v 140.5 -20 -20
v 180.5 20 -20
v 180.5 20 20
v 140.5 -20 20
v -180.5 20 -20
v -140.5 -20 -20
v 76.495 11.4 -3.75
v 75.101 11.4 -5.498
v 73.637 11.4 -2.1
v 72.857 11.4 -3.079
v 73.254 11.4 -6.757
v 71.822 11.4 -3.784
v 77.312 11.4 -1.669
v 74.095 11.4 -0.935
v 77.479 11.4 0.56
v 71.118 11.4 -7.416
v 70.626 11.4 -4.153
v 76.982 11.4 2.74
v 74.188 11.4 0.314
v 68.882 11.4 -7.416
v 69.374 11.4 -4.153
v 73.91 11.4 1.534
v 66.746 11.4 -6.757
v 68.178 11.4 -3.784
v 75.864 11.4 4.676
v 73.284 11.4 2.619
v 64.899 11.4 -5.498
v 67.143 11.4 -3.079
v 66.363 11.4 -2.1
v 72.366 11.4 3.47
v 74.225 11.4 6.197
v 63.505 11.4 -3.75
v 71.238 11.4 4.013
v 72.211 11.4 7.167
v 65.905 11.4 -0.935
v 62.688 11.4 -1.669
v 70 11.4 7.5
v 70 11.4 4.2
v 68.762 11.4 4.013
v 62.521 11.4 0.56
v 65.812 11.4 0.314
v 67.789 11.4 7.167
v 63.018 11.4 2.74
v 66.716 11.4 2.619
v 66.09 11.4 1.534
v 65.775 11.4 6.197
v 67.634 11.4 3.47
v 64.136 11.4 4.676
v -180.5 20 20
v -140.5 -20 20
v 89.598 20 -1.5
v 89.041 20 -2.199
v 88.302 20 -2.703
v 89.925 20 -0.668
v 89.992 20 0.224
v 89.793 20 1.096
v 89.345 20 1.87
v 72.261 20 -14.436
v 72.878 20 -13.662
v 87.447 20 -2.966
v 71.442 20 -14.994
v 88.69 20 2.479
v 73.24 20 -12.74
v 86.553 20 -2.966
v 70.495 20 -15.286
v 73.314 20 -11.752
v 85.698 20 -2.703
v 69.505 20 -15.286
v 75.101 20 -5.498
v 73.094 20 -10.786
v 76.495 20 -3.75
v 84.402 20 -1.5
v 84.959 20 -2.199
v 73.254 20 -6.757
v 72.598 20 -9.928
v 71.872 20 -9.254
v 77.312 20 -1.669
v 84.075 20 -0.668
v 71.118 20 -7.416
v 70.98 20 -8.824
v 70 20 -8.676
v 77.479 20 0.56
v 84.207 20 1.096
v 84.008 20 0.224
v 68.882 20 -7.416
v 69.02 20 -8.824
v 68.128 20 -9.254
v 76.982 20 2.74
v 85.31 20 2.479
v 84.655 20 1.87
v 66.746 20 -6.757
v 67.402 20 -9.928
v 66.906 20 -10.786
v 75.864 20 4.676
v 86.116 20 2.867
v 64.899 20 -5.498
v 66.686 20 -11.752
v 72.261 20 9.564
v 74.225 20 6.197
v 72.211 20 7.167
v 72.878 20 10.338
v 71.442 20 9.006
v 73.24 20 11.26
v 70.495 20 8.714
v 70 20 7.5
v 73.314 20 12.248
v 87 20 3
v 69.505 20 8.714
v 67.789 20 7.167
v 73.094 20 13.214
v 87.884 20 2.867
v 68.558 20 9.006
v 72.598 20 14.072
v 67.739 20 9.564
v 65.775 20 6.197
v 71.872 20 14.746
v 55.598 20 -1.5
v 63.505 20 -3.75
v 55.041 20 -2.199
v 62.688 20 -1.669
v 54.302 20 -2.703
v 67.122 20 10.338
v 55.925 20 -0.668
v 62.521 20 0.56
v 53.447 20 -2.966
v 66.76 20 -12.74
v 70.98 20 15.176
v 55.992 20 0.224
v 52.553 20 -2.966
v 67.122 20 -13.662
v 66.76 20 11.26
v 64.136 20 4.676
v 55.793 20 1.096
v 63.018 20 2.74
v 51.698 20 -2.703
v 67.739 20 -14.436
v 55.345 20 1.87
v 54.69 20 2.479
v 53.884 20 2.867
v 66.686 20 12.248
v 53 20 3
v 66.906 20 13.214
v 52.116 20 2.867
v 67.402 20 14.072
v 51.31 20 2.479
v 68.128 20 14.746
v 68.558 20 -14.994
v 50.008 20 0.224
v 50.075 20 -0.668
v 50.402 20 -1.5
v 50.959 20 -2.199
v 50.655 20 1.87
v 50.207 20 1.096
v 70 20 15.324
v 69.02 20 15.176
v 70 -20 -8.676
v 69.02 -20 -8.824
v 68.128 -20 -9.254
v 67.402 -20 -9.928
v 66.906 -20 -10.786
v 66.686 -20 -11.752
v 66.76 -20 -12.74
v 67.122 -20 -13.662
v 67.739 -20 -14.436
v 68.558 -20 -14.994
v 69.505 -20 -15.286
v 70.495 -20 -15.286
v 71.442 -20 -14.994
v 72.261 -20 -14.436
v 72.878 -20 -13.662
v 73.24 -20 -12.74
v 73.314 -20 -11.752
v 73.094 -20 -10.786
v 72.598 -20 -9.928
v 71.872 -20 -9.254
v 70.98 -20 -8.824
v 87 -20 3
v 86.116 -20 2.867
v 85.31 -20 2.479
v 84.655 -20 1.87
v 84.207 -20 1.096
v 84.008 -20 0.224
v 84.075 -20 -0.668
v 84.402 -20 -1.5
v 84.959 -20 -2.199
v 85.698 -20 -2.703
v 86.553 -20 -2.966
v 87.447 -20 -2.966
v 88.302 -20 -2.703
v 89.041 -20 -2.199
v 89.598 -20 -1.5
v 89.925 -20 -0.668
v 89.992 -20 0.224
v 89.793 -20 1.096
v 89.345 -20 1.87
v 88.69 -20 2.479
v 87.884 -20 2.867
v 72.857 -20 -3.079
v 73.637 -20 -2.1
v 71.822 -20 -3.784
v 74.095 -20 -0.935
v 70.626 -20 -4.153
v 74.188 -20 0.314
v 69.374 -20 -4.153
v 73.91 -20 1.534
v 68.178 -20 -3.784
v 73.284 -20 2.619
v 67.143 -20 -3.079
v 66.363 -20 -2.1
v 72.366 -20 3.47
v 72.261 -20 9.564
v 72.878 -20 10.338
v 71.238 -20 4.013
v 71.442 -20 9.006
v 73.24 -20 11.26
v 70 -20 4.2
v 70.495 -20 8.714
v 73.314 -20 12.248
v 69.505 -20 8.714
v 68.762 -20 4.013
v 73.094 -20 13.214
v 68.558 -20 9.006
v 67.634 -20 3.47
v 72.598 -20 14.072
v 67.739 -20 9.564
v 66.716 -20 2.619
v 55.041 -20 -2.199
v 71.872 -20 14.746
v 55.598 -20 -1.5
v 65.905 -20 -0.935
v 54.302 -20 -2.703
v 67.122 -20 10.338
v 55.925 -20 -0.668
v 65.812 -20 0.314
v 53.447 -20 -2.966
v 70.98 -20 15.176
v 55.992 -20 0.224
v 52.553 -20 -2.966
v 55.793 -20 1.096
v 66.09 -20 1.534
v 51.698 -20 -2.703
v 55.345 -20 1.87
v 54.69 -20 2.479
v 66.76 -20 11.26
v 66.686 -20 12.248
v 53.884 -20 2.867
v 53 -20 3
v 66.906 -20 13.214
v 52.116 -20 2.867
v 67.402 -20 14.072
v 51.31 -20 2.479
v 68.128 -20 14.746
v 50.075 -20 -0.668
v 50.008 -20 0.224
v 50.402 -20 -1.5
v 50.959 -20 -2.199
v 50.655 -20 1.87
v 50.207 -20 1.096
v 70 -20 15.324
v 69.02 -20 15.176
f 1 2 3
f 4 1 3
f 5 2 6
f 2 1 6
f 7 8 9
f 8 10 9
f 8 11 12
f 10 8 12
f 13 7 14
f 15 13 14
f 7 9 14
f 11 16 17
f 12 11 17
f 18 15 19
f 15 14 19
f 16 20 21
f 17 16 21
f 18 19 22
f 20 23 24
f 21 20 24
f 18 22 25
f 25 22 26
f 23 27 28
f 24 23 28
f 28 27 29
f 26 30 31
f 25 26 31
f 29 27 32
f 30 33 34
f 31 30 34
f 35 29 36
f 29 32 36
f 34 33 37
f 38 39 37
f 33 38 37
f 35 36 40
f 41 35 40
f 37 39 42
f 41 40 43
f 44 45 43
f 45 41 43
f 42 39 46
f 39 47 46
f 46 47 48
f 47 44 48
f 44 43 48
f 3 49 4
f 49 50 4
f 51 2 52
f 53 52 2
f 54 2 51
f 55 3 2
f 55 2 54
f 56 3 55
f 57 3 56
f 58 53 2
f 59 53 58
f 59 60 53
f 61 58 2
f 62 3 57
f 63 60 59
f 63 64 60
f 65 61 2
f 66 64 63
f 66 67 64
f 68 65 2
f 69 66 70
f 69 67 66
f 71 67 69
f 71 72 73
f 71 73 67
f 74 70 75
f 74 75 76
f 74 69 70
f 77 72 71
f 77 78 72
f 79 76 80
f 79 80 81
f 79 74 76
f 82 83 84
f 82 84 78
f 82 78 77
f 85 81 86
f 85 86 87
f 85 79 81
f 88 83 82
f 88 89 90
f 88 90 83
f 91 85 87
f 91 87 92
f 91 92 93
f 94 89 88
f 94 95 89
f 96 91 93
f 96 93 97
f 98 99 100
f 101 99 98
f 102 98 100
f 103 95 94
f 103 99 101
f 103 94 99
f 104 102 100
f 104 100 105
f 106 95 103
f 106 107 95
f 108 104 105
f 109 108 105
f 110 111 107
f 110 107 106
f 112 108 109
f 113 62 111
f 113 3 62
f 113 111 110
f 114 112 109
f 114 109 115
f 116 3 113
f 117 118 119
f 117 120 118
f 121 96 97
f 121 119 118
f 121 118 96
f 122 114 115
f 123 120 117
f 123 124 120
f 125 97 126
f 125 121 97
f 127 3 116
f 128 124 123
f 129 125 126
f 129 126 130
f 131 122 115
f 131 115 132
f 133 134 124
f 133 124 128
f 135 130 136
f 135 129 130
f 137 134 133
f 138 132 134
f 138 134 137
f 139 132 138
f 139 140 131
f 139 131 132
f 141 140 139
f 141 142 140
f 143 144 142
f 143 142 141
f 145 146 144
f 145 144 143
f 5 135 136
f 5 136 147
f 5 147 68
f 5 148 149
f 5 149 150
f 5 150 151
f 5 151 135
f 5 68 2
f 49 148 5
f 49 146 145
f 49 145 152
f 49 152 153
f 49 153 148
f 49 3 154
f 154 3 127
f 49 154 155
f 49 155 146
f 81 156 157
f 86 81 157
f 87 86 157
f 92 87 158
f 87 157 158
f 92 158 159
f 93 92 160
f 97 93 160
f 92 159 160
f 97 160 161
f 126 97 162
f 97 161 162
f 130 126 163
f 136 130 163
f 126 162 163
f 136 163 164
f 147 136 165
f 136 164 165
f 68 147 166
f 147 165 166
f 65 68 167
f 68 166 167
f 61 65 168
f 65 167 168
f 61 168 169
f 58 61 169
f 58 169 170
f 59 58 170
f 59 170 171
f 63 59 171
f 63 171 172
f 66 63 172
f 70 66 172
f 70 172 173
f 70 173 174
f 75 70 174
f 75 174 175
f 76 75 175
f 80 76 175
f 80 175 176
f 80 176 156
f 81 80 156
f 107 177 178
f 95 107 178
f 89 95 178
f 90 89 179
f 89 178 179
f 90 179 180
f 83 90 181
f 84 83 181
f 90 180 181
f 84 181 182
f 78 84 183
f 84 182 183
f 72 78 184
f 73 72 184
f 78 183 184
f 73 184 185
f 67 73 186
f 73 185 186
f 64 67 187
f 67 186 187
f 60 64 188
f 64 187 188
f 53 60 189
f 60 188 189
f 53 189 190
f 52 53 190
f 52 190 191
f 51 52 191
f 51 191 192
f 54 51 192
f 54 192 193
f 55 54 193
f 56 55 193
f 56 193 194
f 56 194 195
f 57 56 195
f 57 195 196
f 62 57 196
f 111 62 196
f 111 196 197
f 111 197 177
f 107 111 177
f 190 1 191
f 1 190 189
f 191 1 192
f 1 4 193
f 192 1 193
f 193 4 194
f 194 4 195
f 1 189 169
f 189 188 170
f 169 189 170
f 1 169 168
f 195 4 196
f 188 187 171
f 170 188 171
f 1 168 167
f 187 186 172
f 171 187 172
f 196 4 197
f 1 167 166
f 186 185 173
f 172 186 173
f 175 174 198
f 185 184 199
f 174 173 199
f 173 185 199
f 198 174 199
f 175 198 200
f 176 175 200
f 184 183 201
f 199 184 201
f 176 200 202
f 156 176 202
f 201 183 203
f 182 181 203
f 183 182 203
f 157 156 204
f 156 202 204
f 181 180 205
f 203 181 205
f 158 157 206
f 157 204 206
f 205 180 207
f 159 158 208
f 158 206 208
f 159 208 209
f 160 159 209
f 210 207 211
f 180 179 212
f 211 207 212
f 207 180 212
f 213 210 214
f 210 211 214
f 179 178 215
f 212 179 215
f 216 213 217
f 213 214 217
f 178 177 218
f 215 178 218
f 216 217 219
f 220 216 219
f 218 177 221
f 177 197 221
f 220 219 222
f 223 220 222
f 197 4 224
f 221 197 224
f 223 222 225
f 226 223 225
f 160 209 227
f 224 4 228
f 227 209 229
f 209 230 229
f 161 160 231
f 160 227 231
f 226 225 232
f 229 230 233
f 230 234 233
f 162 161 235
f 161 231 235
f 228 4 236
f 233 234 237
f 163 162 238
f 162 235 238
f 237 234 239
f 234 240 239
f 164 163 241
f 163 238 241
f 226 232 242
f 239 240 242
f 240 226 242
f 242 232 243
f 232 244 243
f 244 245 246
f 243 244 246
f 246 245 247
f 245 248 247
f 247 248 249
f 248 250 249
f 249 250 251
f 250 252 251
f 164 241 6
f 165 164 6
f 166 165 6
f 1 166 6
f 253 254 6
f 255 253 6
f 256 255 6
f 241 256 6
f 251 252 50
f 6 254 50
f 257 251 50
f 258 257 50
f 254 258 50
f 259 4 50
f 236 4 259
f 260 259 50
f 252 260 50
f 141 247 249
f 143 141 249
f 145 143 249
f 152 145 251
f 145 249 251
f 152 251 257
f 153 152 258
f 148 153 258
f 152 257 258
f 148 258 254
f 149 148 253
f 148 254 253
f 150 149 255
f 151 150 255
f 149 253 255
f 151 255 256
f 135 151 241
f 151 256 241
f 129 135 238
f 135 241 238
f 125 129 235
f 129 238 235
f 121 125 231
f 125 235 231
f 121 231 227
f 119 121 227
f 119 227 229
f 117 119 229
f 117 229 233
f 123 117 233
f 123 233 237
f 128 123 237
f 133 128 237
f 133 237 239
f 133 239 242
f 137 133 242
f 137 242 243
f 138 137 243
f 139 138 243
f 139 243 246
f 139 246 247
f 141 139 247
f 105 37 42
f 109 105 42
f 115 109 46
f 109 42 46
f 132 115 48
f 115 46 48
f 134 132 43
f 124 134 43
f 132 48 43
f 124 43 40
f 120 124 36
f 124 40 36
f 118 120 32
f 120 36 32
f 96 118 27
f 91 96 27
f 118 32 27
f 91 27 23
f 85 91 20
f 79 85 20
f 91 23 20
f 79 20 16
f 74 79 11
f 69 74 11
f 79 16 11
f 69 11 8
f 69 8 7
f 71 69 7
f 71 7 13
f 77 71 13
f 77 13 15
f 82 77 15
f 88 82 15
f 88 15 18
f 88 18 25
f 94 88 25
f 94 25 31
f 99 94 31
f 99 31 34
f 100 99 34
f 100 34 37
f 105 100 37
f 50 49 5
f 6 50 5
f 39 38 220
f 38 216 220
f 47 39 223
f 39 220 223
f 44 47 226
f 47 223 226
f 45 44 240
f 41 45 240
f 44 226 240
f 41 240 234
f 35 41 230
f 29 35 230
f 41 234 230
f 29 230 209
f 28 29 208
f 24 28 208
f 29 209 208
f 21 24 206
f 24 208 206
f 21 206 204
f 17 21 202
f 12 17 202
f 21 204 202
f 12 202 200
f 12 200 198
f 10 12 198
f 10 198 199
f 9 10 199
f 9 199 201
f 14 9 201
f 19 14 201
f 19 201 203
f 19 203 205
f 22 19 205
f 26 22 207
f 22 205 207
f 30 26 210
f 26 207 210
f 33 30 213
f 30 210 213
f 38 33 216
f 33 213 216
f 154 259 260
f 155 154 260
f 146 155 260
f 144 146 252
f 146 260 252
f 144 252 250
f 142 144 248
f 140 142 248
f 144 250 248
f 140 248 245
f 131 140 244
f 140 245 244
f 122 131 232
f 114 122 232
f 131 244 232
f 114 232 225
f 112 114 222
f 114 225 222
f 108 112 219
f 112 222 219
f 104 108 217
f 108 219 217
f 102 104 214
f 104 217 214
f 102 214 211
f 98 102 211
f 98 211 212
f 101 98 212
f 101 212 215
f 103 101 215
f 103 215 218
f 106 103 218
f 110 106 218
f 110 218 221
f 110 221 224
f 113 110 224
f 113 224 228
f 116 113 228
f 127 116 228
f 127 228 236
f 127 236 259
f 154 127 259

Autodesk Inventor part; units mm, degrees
ref_plane "XZ Plane" through (0, 0, 0) normal (0, 1, 0) x (-1, 0, 0)
ref_plane "XY Plane" through (0, 0, 0) normal (0, 0, 1) x (1, 0, 0)
sketch "Skizze1" plane through (0, 0, 0) normal (0, 1, 0) x (-1, 0, 0)
  line L0 (180.5, 20) -> (-180.5, 20)
  line L1 (-180.5, 20) -> (-180.5, -20)
  line L2 (-180.5, -20) -> (180.5, -20)
  line L3 (180.5, -20) -> (180.5, 20)
  line L4 (180.5, 20) -> (-180.5, -20) construction
  line L5 (-180.5, 20) -> (180.5, -20) construction
  point P0 (0, 0)
  dimension "d0" = 361
  dimension "d1" = 40
extrude "Extrusion1" add sketch "Skizze1" along normal mid plane 40
chamfer "Fasen1" distance 40 angle 45 2 edges at (-180.5, -20, 0) (180.5, -20, 0)
sketch "Skizze2" plane through (0, 20, 0) normal (0, 1, 0) x (1, 0, 0)
  line L0 (180.5, -20) -> (180.5, 20) projected
  line L1 (-180.5, 20) -> (-180.5, -20) projected
  line L2 (180.5, 20) -> (-180.5, 20) projected
  line L3 (-180.5, 0) -> (180.5, 0) construction
  line L4 (-180.5, -20) -> (180.5, -20) projected
  line L5 (70, -20) -> (70, 20) construction
  point P0 (0, 0)
  point P1 (70, 0)
  point P2 (87, 0)
  point P3 (53, 0)
  point P4 (70, -12)
  point P5 (70, 12)
  point P6 (70, 0)
  dimension "d24" = 20
  dimension "d25" = 17
  dimension "d26" = 17
  dimension "d34" = 70
  dimension "d35" = 12
  dimension "d36" = 12
hole "Bohrung1" at (87, 20, 0) at (53, 20, 0) direction (0, -1, 0) diameter 6 end through all
hole "Hole3" at (70, 20, 0) direction (0, -1, 0) diameter 8.4 end through all counterbore diameter 15 counterbore depth 8.6
hole "Hole4" at (70, 20, 12) at (70, 20, -12) direction (0, -1, 0) diameter 6.647 end through all thread size "M8x1.25" class "6H" standard "ISO Metric profile"
ref_plane "Work Plane1" through (70, 20, 12) normal (1, 0, 0) x (0, 1, 0)
equation "\"d0\" = Laenge_Rahmen"
equation "\"d1\" = Breite_Rahmen"
equation "\"d2\" = Hoehe_Rahmen"
equation "\"d4\" = Breite_Rahmen"
equation "\"d24\" = Abstand_Bohrung_Rahmen"
equation "\"d25\" = 0.5 * Abtand_Fuehrungsstifte"
equation "\"d26\" = d25"
equation "\"d34\" = Exzentrizität"
equation "\"d35\" = Madenschraube_Abstand"
equation "\"d36\" = d35"
equation "\"d9\" = Durchmesser_Stifte"
equation "\"Breite_Rahmen\" = 40"
equation "\"Hoehe_Rahmen\" = Breite_Rahmen"
equation "\"Breite_Bauteiltraeger\" = 239"
equation "\"Lange_Bauteiltraeger\" = Breite_Bauteiltraeger"
equation "\"Laenge_Rahmen\" = Innenmaß_Rahmen + 2 * Breite_Rahmen"
equation "\"Toleranz_Verstellung\" = 1"
equation "\"Abtand_Fuehrungsstifte\" = 34"
equation "\"Durchmesser_Stifte\" = 6"
equation "\"Abstand_Bohrung_Rahmen\" = 20"
equation "\"Exzentrizität\" = 70"
equation "\"Madenschraube_Abstand\" = 12"
equation "\"Innenmaß_Rahmen\" = 281"
properties part number "TS_Positionierungseinheit_Rahmen_int"
